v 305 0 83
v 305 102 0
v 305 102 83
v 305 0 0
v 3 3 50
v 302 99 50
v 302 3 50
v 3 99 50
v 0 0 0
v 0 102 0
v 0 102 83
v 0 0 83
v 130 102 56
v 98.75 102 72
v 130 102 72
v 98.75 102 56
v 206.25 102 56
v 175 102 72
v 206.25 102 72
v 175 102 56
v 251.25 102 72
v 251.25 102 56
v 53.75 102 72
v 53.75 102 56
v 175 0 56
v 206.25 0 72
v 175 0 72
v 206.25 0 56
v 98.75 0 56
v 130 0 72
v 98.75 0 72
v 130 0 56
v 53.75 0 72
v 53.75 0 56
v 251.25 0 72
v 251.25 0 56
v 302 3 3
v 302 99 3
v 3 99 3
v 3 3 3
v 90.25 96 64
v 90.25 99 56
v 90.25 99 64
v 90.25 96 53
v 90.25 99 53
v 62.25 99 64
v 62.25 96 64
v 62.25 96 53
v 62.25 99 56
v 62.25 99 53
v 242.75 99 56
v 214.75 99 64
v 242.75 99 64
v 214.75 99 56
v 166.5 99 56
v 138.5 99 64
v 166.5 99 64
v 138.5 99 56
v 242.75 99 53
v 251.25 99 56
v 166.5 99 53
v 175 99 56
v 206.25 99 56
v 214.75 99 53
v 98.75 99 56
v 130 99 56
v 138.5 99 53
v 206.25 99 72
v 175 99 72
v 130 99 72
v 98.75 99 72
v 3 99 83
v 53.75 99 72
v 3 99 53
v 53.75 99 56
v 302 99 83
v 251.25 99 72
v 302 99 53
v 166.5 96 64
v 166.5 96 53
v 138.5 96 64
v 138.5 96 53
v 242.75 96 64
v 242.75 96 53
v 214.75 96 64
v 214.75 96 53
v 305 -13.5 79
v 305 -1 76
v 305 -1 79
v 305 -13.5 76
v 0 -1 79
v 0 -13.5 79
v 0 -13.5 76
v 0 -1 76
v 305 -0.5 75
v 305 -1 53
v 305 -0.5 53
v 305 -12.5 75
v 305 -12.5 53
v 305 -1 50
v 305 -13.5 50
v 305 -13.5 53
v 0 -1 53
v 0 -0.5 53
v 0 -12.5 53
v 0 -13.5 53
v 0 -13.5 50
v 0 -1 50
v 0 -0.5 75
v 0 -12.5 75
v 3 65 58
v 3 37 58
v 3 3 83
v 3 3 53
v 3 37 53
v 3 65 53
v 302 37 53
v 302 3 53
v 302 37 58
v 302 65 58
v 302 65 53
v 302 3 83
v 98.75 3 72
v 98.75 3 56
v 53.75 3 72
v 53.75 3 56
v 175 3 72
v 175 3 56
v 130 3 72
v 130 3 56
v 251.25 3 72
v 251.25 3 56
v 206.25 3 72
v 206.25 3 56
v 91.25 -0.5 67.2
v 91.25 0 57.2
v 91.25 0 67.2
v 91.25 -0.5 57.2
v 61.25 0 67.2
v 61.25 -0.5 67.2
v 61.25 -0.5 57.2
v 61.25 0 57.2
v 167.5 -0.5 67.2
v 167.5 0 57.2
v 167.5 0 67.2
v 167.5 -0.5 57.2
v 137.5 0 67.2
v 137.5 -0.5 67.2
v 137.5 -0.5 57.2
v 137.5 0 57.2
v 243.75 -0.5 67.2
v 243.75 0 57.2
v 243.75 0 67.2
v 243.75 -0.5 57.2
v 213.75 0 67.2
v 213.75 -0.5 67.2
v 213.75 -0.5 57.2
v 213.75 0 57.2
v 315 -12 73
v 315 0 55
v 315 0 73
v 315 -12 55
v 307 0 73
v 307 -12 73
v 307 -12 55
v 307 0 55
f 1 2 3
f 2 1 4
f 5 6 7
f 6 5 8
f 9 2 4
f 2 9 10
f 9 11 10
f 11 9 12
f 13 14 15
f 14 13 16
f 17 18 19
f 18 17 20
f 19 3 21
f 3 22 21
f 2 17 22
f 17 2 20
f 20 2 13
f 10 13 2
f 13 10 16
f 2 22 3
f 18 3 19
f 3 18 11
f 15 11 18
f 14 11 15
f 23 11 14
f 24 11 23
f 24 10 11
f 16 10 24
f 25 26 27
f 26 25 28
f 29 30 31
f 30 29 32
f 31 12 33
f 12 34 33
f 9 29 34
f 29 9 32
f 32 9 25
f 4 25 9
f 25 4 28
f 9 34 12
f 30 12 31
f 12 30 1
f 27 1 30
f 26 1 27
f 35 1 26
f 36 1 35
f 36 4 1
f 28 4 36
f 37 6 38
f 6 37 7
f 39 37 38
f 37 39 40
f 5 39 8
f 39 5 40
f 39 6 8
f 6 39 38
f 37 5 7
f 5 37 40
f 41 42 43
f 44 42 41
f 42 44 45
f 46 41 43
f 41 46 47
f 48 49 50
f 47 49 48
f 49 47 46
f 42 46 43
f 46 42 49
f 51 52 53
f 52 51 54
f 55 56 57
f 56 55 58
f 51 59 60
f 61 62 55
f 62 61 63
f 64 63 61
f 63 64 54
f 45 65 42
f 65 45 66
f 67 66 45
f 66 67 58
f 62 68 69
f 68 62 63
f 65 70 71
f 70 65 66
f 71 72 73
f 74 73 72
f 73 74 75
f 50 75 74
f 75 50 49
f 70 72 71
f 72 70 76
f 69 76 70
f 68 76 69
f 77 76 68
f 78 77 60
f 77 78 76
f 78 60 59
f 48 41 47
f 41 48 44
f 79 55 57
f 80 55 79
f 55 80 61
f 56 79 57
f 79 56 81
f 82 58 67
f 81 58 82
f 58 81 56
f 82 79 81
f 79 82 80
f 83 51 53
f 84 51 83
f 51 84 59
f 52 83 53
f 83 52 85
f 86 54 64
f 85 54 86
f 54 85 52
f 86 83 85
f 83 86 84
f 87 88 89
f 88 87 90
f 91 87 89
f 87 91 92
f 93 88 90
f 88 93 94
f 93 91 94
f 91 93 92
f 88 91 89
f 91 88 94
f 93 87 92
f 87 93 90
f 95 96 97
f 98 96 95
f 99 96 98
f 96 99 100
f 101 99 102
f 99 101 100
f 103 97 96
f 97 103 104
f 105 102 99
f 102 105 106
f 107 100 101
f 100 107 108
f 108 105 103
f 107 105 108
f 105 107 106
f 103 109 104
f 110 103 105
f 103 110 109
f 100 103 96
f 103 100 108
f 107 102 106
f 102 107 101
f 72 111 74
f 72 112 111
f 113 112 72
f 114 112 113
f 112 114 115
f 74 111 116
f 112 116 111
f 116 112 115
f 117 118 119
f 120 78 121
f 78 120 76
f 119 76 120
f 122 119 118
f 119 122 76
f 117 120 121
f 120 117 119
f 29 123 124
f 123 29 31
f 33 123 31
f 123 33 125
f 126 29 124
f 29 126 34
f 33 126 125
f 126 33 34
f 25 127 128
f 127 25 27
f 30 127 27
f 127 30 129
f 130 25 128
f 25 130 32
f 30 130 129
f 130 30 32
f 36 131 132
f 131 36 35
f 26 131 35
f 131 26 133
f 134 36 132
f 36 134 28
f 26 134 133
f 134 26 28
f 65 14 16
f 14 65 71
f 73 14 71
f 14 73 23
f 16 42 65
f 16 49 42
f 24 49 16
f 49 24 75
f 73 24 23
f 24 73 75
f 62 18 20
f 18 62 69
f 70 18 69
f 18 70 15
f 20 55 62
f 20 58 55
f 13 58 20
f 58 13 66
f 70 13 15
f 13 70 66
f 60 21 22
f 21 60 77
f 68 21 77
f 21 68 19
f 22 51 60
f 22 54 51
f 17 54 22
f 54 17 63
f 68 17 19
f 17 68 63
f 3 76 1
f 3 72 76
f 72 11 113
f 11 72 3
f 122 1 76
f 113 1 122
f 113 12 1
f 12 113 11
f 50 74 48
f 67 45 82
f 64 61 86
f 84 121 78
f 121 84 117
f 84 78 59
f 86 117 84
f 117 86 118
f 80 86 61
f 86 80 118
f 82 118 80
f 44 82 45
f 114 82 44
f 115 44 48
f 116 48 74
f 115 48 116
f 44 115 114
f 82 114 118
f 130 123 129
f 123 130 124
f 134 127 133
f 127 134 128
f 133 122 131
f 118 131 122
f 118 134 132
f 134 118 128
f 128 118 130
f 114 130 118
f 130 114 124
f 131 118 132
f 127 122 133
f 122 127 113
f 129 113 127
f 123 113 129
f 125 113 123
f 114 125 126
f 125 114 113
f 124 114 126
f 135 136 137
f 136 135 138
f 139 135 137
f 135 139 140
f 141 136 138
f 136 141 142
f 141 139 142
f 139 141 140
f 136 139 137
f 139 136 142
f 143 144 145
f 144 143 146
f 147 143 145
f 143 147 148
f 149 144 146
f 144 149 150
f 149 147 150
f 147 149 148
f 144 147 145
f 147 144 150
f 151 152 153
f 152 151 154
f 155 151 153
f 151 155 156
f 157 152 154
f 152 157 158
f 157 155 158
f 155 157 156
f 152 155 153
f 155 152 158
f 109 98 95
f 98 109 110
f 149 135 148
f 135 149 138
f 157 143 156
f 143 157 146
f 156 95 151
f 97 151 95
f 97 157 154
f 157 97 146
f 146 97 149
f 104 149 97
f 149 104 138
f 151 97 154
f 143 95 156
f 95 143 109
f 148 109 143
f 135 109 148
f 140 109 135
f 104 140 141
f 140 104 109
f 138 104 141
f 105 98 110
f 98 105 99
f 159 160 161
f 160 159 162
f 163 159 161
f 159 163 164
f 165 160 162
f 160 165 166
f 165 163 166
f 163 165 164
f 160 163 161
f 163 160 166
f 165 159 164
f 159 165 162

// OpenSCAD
// 02_tabbed_slider_detent.scad
// Variant 2: X-sliding bar with strong detent – bar shifts LEFT/RIGHT to align tongues with windows.
// Housing on exterior of new tray front face (y<0). Bar slides in X direction.
// UNLOCKED: bar shifted so tongues are BETWEEN windows (not aligned → no collision on drop).
// LOCKED: bar shifted back, tongues centered on window X positions.
// Then bar also moves +Y by small ENGAGE amount to seat tongues into windows.
// Separate detent holds each position.
//
// Benefit: can be operated end-on from the short ends (x=0 or x=305 face).
// Rear: 3 fixed capture posts inside footprint.
//
// lock=0: bar shifted right (unlocked, tongues between windows)
// lock=1: bar centered (locked, tongues in windows)

lock = 1;
$fn = 48;

TW = 305; TD = 102; TH_NEW = 50; TH_TOP = 33; WALL = 3;
TOP_BASE_Z = TH_NEW;

WIN_W = 45; WIN_H = 16; WIN_Z_CTR = 64;
WIN_Z_BOT = WIN_Z_CTR - WIN_H/2;   // 56
WIN_Z_TOP = WIN_Z_CTR + WIN_H/2;   // 72
WIN_XS = [TW*1/4, TW*2/4, TW*3/4]; // 76.25, 152.5, 228.75

TONGUE_W = 30; TONGUE_H = 10; CL = 1.2;

// Lateral shift to unlock: move tongues between windows
// Gap between adjacent windows: (WIN_XS[1]-WIN_XS[0]) - WIN_W = 76.25 - 45 = 31.25mm
// Shift by half gap (15.6mm) centers tongues in the gap between windows
SHIFT = 22;   // X shift to unlock (tongue lands between windows, fully on solid wall)

// Bar body
BAR_W = TW + 2*SHIFT;   // wider to slide without exposing ends
BAR_H = WIN_H + 6;
BAR_Z0 = WIN_Z_BOT - 3;
BAR_D = 12;    // Y exterior depth

// Tongue height in window
TONGUE_ENGAGE = 5;  // Y penetration into window when locked

// Housing flanges
HSG_X0 = -SHIFT; HSG_XLEN = TW + 2*SHIFT;

// Detent
DET_R = 2.0;

// Rear posts
RPOST_W = 28; RPOST_H = 14; RPOST_D = WALL;

// End hooks
LIP_T = WALL; LIP_W = 28; LIP_H = 8;

COL_NEW  = "#1565C0";
COL_TOP  = "#90A4AE";
COL_BOLT = "#F9A825";

module new_tray() {
    color(COL_NEW) union() {
        difference() {
            cube([TW, TD, TH_NEW]);
            translate([WALL, WALL, WALL])
                cube([TW-2*WALL, TD-2*WALL, TH_NEW-WALL+0.1]);
            // tongue pass-through slots in front wall (window positions)
            for (wx = WIN_XS)
                translate([wx - TONGUE_W/2 - CL, -0.1, WIN_Z_BOT + CL])
                    cube([TONGUE_W + 2*CL, WALL + 0.2, TONGUE_H]);
            // channel for bar rail on exterior (pocket in front face exterior region)
            translate([0, -BAR_D - 1, BAR_Z0 - 1])
                cube([TW, BAR_D + 0.5, BAR_H + 2]);
            // detent sockets in locked and unlocked positions
            translate([TW/2, -BAR_D/2, BAR_Z0 + BAR_H/2])
                sphere(r=DET_R);
        }

        // Housing top and bottom flanges (keep bar captive in Z)
        translate([0, -BAR_D - 1.5, BAR_Z0 + BAR_H + 1])
            cube([TW, BAR_D + 0.5, WALL]);
        translate([0, -BAR_D - 1.5, BAR_Z0 - WALL])
            cube([TW, BAR_D + 0.5, WALL]);

        // Rear capture posts
        for (wx = WIN_XS)
            translate([wx - RPOST_W/2, TD - WALL - RPOST_D, TOP_BASE_Z])
                cube([RPOST_W, RPOST_D, RPOST_H]);

        // End rim-lip hooks
        translate([0, TD/2 - LIP_W/2, TOP_BASE_Z])
            cube([LIP_T, LIP_W, LIP_H]);
        translate([TW - LIP_T, TD/2 - LIP_W/2, TOP_BASE_Z])
            cube([LIP_T, LIP_W, LIP_H]);
    }
}

module top_tray() {
    color(COL_TOP) translate([0, 0, TOP_BASE_Z]) difference() {
        cube([TW, TD, TH_TOP]);
        translate([WALL, WALL, WALL]) cube([TW-2*WALL, TD-2*WALL, TH_TOP]);
        for (wx = WIN_XS)
            translate([wx-WIN_W/2, -0.1, WIN_Z_BOT-TOP_BASE_Z])
                cube([WIN_W, WALL+0.2, WIN_H]);
        for (wx = WIN_XS)
            translate([wx-WIN_W/2, TD-WALL-0.1, WIN_Z_BOT-TOP_BASE_Z])
                cube([WIN_W, WALL+0.2, WIN_H]);
    }
}

module slide_bar_x(shift_x) {
    // shift_x = 0 → locked (tongues on windows), SHIFT → unlocked (tongues between windows)
    color(COL_BOLT)
    translate([shift_x, 0, 0]) {
        // bar body exterior
        translate([0, -BAR_D - 0.5, BAR_Z0])
            cube([TW, BAR_D, BAR_H]);
        // 3 tongues pointing +Y at correct Z
        for (wx = WIN_XS)
            translate([wx - TONGUE_W/2, -TONGUE_ENGAGE - WALL, WIN_Z_BOT + CL])
                cube([TONGUE_W, TONGUE_ENGAGE + WALL, TONGUE_H]);
        // end-pull tab (right end, accessible from x=305 face)
        translate([TW + 2, -BAR_D/2 - 6, BAR_Z0 + 2])
            cube([8, 12, BAR_H - 4]);
        // detent nub
        translate([TW/2, -BAR_D/2 - 0.5, BAR_Z0 + BAR_H/2])
            sphere(r=DET_R * 0.82);
    }
}

// ── Assembly ───────────────────────────────────────────────────────────────
bar_shift = (lock == 1) ? 0 : SHIFT;

new_tray();
top_tray();
slide_bar_x(bar_shift);
